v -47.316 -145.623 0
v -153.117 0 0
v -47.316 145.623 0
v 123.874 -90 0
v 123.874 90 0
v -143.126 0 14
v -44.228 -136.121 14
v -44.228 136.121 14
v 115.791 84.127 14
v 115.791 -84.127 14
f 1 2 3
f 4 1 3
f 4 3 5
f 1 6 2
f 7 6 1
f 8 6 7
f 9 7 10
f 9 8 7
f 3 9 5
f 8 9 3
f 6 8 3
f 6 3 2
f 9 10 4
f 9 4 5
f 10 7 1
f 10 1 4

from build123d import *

# Parameters (mm, degrees)
F1_DEPTH = 14
F2_SIZE2 = 8.082894
F2_SIZE  = 13.99999


# Not quite as in the source:
# - a fillet or chamfer is up to 0.001 mm smaller than in the source, because OpenCascade refuses the exact size


with BuildPart() as f1:
    # F0 (on Top) → F1 (new body)
    with BuildSketch(Plane.XY):
        Polygon((123.8743728424, -90), (123.8743728424, 90), (-47.3158000907, 145.6230589875), (-153.1171455034, 0), (-47.3158000907, -145.6230589875), align=None)
    extrude(amount=F1_DEPTH)

    # F2 (size 14 and 8.0829037687 in the source; OpenCascade refuses exactly that, so slightly less here)
    f2_edges = [f1.edges().sort_by_distance(p)[0] for p in [
        (38.279286, -117.811529, 14),
        (123.874373, 0, 14),
        (38.279286, 117.811529, 14),
        (-100.216473, 72.811529, 14),
        (-100.216473, -72.811529, 14),
    ]]
    chamfer(f2_edges, length=F2_SIZE, length2=F2_SIZE2)


with BuildPart() as f3_1:
    # F3: copy of F1
    add(f1.part)


with BuildPart() as f5_1:
    # F5: copy of F1
    add(f1.part.moved(Location((14, 14, 14))))


solid = f1.part
